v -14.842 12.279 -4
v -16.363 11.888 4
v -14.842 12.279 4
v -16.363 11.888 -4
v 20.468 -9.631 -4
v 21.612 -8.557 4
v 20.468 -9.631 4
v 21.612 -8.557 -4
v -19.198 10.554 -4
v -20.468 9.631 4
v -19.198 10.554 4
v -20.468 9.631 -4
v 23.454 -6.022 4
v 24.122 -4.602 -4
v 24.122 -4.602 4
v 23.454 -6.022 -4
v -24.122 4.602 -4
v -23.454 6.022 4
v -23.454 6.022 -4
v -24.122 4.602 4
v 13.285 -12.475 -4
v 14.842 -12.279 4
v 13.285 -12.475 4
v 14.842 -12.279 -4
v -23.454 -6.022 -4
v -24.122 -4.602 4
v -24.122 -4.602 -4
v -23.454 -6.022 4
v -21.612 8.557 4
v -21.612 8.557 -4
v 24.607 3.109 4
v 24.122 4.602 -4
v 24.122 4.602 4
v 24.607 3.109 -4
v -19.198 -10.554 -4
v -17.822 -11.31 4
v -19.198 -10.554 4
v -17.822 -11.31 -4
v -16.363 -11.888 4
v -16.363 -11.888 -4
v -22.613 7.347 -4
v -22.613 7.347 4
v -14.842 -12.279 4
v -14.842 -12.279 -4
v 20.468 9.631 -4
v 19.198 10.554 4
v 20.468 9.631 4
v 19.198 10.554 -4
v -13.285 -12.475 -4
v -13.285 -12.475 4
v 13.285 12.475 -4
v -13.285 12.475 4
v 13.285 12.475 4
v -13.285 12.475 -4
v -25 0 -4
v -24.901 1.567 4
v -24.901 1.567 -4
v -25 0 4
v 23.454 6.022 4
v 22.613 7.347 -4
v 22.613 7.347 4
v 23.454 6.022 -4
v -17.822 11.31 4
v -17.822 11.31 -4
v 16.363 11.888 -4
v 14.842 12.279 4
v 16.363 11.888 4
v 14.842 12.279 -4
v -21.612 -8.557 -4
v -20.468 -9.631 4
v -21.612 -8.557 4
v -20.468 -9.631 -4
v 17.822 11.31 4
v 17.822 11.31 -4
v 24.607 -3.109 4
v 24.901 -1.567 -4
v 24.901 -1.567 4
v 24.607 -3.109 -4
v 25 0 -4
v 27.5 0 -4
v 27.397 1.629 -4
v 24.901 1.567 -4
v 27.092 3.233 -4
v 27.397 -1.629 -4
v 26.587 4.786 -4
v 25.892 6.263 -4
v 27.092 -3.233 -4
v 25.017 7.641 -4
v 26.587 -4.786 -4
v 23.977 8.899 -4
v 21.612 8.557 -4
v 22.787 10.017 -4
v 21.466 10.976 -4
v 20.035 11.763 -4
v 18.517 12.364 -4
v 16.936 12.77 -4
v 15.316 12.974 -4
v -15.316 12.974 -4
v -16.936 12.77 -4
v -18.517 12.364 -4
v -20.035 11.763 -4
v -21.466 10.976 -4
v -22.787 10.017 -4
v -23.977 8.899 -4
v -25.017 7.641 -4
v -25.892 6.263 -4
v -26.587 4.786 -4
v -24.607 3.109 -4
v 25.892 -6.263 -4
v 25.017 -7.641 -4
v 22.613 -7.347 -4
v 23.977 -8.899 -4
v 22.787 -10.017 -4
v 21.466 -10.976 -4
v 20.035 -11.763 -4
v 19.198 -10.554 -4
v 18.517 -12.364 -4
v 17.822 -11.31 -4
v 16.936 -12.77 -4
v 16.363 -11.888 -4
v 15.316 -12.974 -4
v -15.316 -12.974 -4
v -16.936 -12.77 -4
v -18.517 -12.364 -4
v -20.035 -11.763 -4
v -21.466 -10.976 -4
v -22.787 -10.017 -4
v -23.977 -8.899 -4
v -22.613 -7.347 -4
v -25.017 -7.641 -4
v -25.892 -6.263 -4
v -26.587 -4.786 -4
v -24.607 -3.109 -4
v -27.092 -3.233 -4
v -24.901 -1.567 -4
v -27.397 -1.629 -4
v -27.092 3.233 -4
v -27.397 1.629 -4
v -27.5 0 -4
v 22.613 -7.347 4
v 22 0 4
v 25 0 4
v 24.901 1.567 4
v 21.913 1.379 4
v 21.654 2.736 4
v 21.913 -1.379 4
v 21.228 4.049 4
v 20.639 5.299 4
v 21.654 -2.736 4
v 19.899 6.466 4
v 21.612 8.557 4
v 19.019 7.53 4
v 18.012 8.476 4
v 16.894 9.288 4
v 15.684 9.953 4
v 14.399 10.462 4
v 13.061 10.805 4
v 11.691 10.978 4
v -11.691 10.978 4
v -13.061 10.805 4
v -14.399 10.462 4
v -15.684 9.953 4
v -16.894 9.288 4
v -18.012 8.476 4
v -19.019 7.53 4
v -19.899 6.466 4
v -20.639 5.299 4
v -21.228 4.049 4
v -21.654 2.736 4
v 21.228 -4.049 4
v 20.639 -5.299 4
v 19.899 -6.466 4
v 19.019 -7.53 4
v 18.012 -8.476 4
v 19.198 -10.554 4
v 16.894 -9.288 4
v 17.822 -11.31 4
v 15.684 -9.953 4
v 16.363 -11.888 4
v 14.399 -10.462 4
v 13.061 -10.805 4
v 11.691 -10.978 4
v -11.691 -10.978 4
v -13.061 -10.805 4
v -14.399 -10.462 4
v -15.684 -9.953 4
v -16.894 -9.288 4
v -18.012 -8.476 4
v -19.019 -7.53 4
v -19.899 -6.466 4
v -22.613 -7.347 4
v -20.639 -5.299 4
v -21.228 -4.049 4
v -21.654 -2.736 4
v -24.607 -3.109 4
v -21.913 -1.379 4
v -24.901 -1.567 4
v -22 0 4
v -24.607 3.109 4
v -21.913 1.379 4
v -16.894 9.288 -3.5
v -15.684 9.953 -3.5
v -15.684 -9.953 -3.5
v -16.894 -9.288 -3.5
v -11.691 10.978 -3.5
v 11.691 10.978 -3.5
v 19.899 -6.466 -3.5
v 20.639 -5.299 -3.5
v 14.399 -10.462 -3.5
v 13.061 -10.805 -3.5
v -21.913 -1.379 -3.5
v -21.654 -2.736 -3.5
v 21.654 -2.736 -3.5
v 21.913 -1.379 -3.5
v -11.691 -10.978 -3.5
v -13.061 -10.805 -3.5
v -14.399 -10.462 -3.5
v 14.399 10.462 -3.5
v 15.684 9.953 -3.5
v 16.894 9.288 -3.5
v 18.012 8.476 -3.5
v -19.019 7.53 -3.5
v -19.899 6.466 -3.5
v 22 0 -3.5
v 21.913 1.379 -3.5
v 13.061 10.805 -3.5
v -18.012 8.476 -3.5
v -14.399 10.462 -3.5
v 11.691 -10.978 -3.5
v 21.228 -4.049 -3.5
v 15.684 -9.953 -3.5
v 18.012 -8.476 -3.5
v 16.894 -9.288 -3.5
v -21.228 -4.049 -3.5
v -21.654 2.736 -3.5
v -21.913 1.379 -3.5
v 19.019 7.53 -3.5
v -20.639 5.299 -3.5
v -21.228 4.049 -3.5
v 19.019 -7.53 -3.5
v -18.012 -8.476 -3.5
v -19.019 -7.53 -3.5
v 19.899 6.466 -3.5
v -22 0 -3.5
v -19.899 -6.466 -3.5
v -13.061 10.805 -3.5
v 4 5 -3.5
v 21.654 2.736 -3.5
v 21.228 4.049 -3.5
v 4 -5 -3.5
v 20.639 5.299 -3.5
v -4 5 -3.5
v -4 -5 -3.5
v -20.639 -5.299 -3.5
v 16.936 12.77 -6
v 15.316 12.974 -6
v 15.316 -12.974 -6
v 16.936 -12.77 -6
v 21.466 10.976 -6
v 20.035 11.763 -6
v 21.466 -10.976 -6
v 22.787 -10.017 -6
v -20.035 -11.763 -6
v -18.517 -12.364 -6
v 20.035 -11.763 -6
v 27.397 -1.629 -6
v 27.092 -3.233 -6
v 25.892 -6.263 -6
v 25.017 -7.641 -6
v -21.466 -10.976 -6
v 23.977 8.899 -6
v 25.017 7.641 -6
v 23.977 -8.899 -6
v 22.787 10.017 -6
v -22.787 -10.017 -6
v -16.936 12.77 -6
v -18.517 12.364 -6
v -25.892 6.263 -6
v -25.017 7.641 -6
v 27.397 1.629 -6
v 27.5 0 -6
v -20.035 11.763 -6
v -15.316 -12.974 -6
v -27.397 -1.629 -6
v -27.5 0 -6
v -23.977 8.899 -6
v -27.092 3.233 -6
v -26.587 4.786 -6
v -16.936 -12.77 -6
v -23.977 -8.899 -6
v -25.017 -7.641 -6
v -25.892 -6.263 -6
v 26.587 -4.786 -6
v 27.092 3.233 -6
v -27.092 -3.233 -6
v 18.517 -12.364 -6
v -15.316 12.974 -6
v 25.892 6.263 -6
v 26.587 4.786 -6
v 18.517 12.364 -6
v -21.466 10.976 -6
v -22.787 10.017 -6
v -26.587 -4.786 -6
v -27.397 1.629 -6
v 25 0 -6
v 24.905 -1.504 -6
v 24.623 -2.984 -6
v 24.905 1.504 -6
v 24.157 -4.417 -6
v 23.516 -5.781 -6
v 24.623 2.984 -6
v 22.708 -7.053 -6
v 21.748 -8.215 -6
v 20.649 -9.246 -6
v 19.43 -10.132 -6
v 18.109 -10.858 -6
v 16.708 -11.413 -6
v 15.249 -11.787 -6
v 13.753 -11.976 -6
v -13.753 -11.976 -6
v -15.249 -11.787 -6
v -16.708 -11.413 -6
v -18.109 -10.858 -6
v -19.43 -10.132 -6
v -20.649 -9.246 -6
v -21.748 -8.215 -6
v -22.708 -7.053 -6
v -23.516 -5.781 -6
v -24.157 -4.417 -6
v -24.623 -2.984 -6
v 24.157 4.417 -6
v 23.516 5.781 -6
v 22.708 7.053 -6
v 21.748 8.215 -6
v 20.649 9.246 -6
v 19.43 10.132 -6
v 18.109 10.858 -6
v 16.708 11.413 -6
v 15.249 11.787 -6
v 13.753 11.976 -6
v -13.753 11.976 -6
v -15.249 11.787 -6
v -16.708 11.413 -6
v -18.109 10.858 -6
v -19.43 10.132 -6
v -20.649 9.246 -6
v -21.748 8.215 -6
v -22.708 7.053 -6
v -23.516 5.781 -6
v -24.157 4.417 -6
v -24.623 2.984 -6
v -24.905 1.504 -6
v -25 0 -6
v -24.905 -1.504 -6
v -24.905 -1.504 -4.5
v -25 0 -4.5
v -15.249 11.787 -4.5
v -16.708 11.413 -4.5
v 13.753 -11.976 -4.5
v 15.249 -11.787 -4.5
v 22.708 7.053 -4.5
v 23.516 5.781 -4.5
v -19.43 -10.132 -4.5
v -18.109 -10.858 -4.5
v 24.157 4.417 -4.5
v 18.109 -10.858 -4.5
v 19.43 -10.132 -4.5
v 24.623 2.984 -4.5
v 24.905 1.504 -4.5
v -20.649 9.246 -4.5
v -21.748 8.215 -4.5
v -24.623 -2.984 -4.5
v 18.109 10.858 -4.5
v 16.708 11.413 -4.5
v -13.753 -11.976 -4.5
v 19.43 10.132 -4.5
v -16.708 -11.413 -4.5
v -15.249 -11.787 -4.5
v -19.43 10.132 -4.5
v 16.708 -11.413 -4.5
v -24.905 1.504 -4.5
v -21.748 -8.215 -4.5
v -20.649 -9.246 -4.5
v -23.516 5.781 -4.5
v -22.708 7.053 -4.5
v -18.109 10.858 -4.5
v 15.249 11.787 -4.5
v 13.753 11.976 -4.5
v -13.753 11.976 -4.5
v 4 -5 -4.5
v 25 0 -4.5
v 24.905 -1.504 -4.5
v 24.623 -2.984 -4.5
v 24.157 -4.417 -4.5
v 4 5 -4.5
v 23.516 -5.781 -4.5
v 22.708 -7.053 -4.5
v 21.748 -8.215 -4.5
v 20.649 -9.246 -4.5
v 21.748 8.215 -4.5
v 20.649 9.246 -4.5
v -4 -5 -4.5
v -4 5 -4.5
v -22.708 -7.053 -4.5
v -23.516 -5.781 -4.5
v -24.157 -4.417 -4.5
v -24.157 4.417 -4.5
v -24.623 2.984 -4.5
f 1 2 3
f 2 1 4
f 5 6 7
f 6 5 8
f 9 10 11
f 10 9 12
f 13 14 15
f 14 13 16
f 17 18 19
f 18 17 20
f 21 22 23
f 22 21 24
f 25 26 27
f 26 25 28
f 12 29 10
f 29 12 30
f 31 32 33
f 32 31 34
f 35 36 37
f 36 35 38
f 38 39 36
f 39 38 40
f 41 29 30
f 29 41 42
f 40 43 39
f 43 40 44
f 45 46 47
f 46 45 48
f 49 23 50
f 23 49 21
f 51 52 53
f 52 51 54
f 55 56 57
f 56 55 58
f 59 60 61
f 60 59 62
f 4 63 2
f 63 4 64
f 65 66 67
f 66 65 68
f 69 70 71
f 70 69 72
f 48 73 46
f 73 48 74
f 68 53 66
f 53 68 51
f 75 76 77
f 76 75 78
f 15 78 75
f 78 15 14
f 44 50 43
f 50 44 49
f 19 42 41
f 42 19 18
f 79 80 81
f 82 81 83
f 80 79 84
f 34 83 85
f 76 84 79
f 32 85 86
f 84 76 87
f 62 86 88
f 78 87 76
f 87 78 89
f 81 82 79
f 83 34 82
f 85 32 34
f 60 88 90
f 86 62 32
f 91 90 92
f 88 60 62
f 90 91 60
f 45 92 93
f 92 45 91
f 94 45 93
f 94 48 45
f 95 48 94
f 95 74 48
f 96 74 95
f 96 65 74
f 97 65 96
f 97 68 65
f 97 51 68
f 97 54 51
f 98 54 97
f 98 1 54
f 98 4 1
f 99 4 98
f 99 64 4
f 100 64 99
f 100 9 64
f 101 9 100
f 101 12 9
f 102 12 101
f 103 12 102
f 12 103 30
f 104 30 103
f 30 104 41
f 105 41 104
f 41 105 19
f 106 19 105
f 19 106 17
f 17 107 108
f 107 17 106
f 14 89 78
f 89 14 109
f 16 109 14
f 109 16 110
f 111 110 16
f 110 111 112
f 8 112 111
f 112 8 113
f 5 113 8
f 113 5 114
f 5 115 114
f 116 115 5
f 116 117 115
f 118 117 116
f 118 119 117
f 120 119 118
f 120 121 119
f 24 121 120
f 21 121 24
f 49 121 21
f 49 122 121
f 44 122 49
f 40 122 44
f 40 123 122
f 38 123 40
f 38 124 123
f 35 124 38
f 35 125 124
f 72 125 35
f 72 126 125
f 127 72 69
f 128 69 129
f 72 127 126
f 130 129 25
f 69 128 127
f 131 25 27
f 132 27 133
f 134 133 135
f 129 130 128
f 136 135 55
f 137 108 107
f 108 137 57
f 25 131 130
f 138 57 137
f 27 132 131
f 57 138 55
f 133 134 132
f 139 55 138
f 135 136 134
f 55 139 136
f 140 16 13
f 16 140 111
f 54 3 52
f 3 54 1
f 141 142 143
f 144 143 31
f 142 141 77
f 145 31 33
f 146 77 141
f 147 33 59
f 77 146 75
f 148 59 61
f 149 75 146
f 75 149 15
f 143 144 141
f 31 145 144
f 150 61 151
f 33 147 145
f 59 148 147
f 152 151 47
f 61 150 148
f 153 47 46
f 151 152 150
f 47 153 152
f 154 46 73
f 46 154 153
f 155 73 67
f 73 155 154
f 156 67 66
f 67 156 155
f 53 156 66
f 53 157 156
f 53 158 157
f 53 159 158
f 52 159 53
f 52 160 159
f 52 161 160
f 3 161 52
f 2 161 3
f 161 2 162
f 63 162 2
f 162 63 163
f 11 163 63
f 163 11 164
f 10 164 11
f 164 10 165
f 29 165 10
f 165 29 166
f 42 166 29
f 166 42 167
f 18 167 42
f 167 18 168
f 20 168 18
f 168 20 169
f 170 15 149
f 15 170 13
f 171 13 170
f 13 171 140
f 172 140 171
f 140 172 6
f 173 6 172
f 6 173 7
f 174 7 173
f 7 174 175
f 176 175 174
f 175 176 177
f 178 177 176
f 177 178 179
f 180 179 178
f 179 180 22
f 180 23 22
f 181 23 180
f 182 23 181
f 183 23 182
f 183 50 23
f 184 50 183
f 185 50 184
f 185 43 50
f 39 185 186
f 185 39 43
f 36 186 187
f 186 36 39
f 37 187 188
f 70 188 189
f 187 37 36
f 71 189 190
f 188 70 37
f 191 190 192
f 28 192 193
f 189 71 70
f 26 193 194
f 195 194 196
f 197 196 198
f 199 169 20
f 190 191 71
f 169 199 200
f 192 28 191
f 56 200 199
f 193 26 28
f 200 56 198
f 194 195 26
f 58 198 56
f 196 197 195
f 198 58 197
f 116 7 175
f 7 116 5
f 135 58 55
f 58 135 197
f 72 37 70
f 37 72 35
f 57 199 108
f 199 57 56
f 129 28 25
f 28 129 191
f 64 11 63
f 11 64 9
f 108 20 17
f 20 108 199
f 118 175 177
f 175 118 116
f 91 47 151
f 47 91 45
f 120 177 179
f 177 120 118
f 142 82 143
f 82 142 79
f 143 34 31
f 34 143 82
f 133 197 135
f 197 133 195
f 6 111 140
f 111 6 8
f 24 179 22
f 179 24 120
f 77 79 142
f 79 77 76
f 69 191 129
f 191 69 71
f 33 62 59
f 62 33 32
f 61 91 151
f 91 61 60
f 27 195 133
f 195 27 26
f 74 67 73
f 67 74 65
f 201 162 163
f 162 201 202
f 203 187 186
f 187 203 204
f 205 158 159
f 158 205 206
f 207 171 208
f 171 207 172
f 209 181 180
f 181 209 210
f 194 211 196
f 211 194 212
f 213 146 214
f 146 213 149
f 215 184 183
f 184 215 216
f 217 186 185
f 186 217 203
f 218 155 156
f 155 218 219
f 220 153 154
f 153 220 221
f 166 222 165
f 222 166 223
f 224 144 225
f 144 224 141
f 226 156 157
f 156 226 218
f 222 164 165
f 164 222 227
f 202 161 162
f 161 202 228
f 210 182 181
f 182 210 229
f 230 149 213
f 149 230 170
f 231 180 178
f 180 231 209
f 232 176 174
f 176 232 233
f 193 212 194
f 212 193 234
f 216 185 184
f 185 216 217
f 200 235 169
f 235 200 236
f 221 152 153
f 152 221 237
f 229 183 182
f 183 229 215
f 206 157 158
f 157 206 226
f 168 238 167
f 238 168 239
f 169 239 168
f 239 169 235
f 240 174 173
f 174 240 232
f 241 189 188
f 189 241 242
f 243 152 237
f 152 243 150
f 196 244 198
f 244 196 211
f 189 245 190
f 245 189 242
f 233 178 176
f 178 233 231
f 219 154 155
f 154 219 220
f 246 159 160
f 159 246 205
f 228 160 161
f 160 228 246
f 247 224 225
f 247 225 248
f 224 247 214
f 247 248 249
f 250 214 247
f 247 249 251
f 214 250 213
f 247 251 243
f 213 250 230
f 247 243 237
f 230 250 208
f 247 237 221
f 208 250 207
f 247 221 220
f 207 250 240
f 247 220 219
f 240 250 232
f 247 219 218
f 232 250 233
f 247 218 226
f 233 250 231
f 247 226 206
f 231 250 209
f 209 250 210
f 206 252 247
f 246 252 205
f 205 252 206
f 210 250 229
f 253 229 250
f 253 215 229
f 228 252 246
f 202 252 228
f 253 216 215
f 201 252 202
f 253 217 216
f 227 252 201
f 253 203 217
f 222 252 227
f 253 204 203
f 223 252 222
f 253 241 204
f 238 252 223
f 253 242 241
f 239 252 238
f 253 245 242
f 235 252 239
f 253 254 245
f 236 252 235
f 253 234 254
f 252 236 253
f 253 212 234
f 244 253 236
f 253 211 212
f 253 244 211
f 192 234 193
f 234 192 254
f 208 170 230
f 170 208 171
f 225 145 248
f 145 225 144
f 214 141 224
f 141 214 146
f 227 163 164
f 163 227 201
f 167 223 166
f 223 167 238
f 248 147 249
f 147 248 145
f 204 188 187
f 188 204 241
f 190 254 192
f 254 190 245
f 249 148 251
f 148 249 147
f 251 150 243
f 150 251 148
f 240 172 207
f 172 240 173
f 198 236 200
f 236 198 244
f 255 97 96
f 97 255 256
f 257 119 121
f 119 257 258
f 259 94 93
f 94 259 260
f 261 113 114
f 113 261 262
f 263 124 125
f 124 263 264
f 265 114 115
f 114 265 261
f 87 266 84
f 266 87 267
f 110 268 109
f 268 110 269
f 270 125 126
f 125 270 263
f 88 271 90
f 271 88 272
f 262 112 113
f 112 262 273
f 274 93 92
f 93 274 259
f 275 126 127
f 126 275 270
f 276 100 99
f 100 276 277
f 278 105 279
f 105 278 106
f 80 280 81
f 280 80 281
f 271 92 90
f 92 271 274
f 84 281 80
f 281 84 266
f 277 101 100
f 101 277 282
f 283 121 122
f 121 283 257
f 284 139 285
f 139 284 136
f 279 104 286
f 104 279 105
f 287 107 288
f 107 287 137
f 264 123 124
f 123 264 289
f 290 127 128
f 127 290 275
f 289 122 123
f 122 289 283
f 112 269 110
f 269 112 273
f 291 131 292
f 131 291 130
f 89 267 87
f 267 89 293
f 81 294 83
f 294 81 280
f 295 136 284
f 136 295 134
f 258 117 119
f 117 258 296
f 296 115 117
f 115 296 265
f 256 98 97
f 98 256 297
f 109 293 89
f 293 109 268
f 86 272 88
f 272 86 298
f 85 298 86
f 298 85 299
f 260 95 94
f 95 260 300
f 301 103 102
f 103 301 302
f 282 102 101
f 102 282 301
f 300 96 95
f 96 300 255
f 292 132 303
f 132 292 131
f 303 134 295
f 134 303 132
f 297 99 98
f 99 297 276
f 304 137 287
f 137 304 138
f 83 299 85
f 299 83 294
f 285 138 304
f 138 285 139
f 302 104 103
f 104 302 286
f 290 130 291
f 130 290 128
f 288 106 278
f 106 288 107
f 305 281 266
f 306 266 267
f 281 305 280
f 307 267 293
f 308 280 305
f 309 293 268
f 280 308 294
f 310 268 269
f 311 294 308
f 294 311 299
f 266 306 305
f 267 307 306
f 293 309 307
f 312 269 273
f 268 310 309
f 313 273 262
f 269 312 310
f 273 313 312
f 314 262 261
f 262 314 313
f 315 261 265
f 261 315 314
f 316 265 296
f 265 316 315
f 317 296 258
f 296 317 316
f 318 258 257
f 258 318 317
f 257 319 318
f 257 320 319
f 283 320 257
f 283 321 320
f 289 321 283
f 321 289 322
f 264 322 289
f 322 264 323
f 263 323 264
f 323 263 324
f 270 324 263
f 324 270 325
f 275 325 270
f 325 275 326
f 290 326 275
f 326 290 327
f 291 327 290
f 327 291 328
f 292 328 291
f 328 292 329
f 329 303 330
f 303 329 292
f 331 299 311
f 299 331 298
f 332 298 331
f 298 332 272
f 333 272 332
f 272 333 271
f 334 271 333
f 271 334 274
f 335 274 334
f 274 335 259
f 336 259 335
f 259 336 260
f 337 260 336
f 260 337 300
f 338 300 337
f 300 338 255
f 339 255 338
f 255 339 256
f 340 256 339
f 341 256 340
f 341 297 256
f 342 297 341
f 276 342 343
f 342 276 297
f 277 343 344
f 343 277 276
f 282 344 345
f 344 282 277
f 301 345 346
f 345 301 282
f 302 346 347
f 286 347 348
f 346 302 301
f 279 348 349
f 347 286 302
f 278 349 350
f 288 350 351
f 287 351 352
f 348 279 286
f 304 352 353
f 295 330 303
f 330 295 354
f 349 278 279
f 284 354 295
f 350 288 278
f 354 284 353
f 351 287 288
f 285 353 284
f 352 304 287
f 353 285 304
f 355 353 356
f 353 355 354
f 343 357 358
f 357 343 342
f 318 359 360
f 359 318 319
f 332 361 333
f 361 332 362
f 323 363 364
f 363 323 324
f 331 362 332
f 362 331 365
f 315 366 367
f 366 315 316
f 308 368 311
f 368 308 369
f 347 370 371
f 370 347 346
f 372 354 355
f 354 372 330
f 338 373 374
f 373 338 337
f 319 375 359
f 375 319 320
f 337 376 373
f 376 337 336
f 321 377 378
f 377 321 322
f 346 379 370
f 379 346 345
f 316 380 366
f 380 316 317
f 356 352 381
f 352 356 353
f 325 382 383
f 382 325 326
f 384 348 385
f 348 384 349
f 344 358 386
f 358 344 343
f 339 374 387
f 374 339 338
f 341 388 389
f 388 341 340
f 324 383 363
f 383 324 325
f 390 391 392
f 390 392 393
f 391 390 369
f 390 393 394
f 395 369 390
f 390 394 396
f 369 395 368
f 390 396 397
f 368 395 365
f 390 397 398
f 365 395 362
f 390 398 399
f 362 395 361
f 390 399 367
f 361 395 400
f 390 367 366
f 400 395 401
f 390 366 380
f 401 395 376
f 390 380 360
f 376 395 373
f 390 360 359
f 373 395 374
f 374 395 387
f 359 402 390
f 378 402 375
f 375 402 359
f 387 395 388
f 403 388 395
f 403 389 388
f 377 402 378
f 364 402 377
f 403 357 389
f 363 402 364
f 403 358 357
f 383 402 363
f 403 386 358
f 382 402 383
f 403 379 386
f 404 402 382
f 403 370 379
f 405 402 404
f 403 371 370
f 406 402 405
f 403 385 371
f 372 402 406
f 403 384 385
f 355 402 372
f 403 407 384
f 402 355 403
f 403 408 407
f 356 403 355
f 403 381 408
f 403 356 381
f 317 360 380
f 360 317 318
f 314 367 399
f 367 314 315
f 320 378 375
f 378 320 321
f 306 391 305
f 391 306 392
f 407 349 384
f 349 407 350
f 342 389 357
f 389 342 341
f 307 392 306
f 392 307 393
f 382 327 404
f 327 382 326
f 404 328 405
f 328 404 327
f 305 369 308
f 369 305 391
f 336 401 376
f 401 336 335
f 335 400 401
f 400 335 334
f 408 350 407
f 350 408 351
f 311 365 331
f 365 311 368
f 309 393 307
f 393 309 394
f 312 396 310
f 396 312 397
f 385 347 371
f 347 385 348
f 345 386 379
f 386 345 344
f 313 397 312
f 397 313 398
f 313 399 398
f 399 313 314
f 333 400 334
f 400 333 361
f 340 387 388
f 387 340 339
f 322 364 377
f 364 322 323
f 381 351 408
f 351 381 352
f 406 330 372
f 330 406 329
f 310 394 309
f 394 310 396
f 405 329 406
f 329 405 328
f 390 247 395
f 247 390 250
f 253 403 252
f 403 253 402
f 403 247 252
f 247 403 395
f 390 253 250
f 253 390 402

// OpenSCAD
// CyberWand v3.0 - 3D 外壳设计 (OpenSCAD)
// 手持魔杖形态，35×25×8mm

// 参数
length = 35;      // 长度 mm
width = 25;       // 宽度 mm
height = 8;       // 高度 mm
wall_thickness = 1.5;  // 壁厚 mm

// 外壳主体 (流线型设计)
module main_body() {
    difference() {
        // 外形 (圆角长方体)
        hull() {
            translate([length/2 - 5, 0, 0])
                cylinder(h = height, r = width/2, center = true, $fn = 50);
            translate([-length/2 + 5, 0, 0])
                cylinder(h = height, r = width/2, center = true, $fn = 50);
        }
        
        // 内部挖空 (容纳 PCB 和电池)
        hull() {
            translate([length/2 - 5 - wall_thickness, 0, 0.5])
                cylinder(h = height, r = width/2 - wall_thickness, center = true, $fn = 50);
            translate([-length/2 + 5 + wall_thickness, 0, 0.5])
                cylinder(h = height, r = width/2 - wall_thickness, center = true, $fn = 50);
        }
    }
}

// 底部盖子
module bottom_cap() {
    difference() {
        // 外形
        hull() {
            translate([length/2 - 3, 0, -height/2 - 1])
                cylinder(h = 2, r = width/2 + 0.5, center = true, $fn = 50);
            translate([-length/2 + 3, 0, -height/2 - 1])
                cylinder(h = 2, r = width/2 + 0.5, center = true, $fn = 50);
        }
        
        // 卡扣槽
        hull() {
            translate([length/2 - 3 - wall_thickness, 0, -height/2 - 1.5])
                cylinder(h = 2, r = width/2 - wall_thickness + 1, center = true, $fn = 50);
            translate([-length/2 + 3 + wall_thickness, 0, -height/2 - 1.5])
                cylinder(h = 2, r = width/2 - wall_thickness + 1, center = true, $fn = 50);
        }
    }
}

// 按键孔 (顶部左侧)
module button_hole() {
    translate([-length/2 + 6, 0, height/2])
        cylinder(h = height, d = 6, center = true);
}

// LED 窗口 (顶部右侧)
module led_window() {
    translate([length/2 - 6, 0, height/2])
        cylinder(h = height, d = 2, center = true);
}

// USB-C 开口 (底部)
module usb_c_cutout() {
    translate([0, 0, -height/2])
        cube([8, 10, 4], center = true);
}

// 挂绳孔 (可选)
module lanyard_hole() {
    translate([-length/2 + 4, 0, 0])
        rotate([90, 0, 0])
            cylinder(h = width, d = 3, center = true);
}

// 完整组装
module assembly() {
    difference() {
        union() {
            main_body();
            bottom_cap();
        }
        
        // 开口
        button_hole();
        led_window();
        usb_c_cutout();
        // lanyard_hole(); // 可选
    }
}

// 握持区域纹理
module grip_texture() {
    for (i = [-10:3:10]) {
        translate([i, width/2 + 0.5, 0])
            rotate([90, 0, 0])
                cylinder(h = 2, d = 1, center = true);
    }
}

// 渲染
color("darkgray")
    assembly();

// 导出说明
// 1. 导出为 STL: main_body.stl, bottom_cap.stl
// 2. 3D 打印材料：TPU 软胶 (握持舒适) 或 PLA+
// 3. 填充率：30% (增加强度)
// 4. 层厚：0.15mm (精细)
// 5. 支撑：需要 (USB-C 开口处)
// 6. 打印方向：底部朝下
